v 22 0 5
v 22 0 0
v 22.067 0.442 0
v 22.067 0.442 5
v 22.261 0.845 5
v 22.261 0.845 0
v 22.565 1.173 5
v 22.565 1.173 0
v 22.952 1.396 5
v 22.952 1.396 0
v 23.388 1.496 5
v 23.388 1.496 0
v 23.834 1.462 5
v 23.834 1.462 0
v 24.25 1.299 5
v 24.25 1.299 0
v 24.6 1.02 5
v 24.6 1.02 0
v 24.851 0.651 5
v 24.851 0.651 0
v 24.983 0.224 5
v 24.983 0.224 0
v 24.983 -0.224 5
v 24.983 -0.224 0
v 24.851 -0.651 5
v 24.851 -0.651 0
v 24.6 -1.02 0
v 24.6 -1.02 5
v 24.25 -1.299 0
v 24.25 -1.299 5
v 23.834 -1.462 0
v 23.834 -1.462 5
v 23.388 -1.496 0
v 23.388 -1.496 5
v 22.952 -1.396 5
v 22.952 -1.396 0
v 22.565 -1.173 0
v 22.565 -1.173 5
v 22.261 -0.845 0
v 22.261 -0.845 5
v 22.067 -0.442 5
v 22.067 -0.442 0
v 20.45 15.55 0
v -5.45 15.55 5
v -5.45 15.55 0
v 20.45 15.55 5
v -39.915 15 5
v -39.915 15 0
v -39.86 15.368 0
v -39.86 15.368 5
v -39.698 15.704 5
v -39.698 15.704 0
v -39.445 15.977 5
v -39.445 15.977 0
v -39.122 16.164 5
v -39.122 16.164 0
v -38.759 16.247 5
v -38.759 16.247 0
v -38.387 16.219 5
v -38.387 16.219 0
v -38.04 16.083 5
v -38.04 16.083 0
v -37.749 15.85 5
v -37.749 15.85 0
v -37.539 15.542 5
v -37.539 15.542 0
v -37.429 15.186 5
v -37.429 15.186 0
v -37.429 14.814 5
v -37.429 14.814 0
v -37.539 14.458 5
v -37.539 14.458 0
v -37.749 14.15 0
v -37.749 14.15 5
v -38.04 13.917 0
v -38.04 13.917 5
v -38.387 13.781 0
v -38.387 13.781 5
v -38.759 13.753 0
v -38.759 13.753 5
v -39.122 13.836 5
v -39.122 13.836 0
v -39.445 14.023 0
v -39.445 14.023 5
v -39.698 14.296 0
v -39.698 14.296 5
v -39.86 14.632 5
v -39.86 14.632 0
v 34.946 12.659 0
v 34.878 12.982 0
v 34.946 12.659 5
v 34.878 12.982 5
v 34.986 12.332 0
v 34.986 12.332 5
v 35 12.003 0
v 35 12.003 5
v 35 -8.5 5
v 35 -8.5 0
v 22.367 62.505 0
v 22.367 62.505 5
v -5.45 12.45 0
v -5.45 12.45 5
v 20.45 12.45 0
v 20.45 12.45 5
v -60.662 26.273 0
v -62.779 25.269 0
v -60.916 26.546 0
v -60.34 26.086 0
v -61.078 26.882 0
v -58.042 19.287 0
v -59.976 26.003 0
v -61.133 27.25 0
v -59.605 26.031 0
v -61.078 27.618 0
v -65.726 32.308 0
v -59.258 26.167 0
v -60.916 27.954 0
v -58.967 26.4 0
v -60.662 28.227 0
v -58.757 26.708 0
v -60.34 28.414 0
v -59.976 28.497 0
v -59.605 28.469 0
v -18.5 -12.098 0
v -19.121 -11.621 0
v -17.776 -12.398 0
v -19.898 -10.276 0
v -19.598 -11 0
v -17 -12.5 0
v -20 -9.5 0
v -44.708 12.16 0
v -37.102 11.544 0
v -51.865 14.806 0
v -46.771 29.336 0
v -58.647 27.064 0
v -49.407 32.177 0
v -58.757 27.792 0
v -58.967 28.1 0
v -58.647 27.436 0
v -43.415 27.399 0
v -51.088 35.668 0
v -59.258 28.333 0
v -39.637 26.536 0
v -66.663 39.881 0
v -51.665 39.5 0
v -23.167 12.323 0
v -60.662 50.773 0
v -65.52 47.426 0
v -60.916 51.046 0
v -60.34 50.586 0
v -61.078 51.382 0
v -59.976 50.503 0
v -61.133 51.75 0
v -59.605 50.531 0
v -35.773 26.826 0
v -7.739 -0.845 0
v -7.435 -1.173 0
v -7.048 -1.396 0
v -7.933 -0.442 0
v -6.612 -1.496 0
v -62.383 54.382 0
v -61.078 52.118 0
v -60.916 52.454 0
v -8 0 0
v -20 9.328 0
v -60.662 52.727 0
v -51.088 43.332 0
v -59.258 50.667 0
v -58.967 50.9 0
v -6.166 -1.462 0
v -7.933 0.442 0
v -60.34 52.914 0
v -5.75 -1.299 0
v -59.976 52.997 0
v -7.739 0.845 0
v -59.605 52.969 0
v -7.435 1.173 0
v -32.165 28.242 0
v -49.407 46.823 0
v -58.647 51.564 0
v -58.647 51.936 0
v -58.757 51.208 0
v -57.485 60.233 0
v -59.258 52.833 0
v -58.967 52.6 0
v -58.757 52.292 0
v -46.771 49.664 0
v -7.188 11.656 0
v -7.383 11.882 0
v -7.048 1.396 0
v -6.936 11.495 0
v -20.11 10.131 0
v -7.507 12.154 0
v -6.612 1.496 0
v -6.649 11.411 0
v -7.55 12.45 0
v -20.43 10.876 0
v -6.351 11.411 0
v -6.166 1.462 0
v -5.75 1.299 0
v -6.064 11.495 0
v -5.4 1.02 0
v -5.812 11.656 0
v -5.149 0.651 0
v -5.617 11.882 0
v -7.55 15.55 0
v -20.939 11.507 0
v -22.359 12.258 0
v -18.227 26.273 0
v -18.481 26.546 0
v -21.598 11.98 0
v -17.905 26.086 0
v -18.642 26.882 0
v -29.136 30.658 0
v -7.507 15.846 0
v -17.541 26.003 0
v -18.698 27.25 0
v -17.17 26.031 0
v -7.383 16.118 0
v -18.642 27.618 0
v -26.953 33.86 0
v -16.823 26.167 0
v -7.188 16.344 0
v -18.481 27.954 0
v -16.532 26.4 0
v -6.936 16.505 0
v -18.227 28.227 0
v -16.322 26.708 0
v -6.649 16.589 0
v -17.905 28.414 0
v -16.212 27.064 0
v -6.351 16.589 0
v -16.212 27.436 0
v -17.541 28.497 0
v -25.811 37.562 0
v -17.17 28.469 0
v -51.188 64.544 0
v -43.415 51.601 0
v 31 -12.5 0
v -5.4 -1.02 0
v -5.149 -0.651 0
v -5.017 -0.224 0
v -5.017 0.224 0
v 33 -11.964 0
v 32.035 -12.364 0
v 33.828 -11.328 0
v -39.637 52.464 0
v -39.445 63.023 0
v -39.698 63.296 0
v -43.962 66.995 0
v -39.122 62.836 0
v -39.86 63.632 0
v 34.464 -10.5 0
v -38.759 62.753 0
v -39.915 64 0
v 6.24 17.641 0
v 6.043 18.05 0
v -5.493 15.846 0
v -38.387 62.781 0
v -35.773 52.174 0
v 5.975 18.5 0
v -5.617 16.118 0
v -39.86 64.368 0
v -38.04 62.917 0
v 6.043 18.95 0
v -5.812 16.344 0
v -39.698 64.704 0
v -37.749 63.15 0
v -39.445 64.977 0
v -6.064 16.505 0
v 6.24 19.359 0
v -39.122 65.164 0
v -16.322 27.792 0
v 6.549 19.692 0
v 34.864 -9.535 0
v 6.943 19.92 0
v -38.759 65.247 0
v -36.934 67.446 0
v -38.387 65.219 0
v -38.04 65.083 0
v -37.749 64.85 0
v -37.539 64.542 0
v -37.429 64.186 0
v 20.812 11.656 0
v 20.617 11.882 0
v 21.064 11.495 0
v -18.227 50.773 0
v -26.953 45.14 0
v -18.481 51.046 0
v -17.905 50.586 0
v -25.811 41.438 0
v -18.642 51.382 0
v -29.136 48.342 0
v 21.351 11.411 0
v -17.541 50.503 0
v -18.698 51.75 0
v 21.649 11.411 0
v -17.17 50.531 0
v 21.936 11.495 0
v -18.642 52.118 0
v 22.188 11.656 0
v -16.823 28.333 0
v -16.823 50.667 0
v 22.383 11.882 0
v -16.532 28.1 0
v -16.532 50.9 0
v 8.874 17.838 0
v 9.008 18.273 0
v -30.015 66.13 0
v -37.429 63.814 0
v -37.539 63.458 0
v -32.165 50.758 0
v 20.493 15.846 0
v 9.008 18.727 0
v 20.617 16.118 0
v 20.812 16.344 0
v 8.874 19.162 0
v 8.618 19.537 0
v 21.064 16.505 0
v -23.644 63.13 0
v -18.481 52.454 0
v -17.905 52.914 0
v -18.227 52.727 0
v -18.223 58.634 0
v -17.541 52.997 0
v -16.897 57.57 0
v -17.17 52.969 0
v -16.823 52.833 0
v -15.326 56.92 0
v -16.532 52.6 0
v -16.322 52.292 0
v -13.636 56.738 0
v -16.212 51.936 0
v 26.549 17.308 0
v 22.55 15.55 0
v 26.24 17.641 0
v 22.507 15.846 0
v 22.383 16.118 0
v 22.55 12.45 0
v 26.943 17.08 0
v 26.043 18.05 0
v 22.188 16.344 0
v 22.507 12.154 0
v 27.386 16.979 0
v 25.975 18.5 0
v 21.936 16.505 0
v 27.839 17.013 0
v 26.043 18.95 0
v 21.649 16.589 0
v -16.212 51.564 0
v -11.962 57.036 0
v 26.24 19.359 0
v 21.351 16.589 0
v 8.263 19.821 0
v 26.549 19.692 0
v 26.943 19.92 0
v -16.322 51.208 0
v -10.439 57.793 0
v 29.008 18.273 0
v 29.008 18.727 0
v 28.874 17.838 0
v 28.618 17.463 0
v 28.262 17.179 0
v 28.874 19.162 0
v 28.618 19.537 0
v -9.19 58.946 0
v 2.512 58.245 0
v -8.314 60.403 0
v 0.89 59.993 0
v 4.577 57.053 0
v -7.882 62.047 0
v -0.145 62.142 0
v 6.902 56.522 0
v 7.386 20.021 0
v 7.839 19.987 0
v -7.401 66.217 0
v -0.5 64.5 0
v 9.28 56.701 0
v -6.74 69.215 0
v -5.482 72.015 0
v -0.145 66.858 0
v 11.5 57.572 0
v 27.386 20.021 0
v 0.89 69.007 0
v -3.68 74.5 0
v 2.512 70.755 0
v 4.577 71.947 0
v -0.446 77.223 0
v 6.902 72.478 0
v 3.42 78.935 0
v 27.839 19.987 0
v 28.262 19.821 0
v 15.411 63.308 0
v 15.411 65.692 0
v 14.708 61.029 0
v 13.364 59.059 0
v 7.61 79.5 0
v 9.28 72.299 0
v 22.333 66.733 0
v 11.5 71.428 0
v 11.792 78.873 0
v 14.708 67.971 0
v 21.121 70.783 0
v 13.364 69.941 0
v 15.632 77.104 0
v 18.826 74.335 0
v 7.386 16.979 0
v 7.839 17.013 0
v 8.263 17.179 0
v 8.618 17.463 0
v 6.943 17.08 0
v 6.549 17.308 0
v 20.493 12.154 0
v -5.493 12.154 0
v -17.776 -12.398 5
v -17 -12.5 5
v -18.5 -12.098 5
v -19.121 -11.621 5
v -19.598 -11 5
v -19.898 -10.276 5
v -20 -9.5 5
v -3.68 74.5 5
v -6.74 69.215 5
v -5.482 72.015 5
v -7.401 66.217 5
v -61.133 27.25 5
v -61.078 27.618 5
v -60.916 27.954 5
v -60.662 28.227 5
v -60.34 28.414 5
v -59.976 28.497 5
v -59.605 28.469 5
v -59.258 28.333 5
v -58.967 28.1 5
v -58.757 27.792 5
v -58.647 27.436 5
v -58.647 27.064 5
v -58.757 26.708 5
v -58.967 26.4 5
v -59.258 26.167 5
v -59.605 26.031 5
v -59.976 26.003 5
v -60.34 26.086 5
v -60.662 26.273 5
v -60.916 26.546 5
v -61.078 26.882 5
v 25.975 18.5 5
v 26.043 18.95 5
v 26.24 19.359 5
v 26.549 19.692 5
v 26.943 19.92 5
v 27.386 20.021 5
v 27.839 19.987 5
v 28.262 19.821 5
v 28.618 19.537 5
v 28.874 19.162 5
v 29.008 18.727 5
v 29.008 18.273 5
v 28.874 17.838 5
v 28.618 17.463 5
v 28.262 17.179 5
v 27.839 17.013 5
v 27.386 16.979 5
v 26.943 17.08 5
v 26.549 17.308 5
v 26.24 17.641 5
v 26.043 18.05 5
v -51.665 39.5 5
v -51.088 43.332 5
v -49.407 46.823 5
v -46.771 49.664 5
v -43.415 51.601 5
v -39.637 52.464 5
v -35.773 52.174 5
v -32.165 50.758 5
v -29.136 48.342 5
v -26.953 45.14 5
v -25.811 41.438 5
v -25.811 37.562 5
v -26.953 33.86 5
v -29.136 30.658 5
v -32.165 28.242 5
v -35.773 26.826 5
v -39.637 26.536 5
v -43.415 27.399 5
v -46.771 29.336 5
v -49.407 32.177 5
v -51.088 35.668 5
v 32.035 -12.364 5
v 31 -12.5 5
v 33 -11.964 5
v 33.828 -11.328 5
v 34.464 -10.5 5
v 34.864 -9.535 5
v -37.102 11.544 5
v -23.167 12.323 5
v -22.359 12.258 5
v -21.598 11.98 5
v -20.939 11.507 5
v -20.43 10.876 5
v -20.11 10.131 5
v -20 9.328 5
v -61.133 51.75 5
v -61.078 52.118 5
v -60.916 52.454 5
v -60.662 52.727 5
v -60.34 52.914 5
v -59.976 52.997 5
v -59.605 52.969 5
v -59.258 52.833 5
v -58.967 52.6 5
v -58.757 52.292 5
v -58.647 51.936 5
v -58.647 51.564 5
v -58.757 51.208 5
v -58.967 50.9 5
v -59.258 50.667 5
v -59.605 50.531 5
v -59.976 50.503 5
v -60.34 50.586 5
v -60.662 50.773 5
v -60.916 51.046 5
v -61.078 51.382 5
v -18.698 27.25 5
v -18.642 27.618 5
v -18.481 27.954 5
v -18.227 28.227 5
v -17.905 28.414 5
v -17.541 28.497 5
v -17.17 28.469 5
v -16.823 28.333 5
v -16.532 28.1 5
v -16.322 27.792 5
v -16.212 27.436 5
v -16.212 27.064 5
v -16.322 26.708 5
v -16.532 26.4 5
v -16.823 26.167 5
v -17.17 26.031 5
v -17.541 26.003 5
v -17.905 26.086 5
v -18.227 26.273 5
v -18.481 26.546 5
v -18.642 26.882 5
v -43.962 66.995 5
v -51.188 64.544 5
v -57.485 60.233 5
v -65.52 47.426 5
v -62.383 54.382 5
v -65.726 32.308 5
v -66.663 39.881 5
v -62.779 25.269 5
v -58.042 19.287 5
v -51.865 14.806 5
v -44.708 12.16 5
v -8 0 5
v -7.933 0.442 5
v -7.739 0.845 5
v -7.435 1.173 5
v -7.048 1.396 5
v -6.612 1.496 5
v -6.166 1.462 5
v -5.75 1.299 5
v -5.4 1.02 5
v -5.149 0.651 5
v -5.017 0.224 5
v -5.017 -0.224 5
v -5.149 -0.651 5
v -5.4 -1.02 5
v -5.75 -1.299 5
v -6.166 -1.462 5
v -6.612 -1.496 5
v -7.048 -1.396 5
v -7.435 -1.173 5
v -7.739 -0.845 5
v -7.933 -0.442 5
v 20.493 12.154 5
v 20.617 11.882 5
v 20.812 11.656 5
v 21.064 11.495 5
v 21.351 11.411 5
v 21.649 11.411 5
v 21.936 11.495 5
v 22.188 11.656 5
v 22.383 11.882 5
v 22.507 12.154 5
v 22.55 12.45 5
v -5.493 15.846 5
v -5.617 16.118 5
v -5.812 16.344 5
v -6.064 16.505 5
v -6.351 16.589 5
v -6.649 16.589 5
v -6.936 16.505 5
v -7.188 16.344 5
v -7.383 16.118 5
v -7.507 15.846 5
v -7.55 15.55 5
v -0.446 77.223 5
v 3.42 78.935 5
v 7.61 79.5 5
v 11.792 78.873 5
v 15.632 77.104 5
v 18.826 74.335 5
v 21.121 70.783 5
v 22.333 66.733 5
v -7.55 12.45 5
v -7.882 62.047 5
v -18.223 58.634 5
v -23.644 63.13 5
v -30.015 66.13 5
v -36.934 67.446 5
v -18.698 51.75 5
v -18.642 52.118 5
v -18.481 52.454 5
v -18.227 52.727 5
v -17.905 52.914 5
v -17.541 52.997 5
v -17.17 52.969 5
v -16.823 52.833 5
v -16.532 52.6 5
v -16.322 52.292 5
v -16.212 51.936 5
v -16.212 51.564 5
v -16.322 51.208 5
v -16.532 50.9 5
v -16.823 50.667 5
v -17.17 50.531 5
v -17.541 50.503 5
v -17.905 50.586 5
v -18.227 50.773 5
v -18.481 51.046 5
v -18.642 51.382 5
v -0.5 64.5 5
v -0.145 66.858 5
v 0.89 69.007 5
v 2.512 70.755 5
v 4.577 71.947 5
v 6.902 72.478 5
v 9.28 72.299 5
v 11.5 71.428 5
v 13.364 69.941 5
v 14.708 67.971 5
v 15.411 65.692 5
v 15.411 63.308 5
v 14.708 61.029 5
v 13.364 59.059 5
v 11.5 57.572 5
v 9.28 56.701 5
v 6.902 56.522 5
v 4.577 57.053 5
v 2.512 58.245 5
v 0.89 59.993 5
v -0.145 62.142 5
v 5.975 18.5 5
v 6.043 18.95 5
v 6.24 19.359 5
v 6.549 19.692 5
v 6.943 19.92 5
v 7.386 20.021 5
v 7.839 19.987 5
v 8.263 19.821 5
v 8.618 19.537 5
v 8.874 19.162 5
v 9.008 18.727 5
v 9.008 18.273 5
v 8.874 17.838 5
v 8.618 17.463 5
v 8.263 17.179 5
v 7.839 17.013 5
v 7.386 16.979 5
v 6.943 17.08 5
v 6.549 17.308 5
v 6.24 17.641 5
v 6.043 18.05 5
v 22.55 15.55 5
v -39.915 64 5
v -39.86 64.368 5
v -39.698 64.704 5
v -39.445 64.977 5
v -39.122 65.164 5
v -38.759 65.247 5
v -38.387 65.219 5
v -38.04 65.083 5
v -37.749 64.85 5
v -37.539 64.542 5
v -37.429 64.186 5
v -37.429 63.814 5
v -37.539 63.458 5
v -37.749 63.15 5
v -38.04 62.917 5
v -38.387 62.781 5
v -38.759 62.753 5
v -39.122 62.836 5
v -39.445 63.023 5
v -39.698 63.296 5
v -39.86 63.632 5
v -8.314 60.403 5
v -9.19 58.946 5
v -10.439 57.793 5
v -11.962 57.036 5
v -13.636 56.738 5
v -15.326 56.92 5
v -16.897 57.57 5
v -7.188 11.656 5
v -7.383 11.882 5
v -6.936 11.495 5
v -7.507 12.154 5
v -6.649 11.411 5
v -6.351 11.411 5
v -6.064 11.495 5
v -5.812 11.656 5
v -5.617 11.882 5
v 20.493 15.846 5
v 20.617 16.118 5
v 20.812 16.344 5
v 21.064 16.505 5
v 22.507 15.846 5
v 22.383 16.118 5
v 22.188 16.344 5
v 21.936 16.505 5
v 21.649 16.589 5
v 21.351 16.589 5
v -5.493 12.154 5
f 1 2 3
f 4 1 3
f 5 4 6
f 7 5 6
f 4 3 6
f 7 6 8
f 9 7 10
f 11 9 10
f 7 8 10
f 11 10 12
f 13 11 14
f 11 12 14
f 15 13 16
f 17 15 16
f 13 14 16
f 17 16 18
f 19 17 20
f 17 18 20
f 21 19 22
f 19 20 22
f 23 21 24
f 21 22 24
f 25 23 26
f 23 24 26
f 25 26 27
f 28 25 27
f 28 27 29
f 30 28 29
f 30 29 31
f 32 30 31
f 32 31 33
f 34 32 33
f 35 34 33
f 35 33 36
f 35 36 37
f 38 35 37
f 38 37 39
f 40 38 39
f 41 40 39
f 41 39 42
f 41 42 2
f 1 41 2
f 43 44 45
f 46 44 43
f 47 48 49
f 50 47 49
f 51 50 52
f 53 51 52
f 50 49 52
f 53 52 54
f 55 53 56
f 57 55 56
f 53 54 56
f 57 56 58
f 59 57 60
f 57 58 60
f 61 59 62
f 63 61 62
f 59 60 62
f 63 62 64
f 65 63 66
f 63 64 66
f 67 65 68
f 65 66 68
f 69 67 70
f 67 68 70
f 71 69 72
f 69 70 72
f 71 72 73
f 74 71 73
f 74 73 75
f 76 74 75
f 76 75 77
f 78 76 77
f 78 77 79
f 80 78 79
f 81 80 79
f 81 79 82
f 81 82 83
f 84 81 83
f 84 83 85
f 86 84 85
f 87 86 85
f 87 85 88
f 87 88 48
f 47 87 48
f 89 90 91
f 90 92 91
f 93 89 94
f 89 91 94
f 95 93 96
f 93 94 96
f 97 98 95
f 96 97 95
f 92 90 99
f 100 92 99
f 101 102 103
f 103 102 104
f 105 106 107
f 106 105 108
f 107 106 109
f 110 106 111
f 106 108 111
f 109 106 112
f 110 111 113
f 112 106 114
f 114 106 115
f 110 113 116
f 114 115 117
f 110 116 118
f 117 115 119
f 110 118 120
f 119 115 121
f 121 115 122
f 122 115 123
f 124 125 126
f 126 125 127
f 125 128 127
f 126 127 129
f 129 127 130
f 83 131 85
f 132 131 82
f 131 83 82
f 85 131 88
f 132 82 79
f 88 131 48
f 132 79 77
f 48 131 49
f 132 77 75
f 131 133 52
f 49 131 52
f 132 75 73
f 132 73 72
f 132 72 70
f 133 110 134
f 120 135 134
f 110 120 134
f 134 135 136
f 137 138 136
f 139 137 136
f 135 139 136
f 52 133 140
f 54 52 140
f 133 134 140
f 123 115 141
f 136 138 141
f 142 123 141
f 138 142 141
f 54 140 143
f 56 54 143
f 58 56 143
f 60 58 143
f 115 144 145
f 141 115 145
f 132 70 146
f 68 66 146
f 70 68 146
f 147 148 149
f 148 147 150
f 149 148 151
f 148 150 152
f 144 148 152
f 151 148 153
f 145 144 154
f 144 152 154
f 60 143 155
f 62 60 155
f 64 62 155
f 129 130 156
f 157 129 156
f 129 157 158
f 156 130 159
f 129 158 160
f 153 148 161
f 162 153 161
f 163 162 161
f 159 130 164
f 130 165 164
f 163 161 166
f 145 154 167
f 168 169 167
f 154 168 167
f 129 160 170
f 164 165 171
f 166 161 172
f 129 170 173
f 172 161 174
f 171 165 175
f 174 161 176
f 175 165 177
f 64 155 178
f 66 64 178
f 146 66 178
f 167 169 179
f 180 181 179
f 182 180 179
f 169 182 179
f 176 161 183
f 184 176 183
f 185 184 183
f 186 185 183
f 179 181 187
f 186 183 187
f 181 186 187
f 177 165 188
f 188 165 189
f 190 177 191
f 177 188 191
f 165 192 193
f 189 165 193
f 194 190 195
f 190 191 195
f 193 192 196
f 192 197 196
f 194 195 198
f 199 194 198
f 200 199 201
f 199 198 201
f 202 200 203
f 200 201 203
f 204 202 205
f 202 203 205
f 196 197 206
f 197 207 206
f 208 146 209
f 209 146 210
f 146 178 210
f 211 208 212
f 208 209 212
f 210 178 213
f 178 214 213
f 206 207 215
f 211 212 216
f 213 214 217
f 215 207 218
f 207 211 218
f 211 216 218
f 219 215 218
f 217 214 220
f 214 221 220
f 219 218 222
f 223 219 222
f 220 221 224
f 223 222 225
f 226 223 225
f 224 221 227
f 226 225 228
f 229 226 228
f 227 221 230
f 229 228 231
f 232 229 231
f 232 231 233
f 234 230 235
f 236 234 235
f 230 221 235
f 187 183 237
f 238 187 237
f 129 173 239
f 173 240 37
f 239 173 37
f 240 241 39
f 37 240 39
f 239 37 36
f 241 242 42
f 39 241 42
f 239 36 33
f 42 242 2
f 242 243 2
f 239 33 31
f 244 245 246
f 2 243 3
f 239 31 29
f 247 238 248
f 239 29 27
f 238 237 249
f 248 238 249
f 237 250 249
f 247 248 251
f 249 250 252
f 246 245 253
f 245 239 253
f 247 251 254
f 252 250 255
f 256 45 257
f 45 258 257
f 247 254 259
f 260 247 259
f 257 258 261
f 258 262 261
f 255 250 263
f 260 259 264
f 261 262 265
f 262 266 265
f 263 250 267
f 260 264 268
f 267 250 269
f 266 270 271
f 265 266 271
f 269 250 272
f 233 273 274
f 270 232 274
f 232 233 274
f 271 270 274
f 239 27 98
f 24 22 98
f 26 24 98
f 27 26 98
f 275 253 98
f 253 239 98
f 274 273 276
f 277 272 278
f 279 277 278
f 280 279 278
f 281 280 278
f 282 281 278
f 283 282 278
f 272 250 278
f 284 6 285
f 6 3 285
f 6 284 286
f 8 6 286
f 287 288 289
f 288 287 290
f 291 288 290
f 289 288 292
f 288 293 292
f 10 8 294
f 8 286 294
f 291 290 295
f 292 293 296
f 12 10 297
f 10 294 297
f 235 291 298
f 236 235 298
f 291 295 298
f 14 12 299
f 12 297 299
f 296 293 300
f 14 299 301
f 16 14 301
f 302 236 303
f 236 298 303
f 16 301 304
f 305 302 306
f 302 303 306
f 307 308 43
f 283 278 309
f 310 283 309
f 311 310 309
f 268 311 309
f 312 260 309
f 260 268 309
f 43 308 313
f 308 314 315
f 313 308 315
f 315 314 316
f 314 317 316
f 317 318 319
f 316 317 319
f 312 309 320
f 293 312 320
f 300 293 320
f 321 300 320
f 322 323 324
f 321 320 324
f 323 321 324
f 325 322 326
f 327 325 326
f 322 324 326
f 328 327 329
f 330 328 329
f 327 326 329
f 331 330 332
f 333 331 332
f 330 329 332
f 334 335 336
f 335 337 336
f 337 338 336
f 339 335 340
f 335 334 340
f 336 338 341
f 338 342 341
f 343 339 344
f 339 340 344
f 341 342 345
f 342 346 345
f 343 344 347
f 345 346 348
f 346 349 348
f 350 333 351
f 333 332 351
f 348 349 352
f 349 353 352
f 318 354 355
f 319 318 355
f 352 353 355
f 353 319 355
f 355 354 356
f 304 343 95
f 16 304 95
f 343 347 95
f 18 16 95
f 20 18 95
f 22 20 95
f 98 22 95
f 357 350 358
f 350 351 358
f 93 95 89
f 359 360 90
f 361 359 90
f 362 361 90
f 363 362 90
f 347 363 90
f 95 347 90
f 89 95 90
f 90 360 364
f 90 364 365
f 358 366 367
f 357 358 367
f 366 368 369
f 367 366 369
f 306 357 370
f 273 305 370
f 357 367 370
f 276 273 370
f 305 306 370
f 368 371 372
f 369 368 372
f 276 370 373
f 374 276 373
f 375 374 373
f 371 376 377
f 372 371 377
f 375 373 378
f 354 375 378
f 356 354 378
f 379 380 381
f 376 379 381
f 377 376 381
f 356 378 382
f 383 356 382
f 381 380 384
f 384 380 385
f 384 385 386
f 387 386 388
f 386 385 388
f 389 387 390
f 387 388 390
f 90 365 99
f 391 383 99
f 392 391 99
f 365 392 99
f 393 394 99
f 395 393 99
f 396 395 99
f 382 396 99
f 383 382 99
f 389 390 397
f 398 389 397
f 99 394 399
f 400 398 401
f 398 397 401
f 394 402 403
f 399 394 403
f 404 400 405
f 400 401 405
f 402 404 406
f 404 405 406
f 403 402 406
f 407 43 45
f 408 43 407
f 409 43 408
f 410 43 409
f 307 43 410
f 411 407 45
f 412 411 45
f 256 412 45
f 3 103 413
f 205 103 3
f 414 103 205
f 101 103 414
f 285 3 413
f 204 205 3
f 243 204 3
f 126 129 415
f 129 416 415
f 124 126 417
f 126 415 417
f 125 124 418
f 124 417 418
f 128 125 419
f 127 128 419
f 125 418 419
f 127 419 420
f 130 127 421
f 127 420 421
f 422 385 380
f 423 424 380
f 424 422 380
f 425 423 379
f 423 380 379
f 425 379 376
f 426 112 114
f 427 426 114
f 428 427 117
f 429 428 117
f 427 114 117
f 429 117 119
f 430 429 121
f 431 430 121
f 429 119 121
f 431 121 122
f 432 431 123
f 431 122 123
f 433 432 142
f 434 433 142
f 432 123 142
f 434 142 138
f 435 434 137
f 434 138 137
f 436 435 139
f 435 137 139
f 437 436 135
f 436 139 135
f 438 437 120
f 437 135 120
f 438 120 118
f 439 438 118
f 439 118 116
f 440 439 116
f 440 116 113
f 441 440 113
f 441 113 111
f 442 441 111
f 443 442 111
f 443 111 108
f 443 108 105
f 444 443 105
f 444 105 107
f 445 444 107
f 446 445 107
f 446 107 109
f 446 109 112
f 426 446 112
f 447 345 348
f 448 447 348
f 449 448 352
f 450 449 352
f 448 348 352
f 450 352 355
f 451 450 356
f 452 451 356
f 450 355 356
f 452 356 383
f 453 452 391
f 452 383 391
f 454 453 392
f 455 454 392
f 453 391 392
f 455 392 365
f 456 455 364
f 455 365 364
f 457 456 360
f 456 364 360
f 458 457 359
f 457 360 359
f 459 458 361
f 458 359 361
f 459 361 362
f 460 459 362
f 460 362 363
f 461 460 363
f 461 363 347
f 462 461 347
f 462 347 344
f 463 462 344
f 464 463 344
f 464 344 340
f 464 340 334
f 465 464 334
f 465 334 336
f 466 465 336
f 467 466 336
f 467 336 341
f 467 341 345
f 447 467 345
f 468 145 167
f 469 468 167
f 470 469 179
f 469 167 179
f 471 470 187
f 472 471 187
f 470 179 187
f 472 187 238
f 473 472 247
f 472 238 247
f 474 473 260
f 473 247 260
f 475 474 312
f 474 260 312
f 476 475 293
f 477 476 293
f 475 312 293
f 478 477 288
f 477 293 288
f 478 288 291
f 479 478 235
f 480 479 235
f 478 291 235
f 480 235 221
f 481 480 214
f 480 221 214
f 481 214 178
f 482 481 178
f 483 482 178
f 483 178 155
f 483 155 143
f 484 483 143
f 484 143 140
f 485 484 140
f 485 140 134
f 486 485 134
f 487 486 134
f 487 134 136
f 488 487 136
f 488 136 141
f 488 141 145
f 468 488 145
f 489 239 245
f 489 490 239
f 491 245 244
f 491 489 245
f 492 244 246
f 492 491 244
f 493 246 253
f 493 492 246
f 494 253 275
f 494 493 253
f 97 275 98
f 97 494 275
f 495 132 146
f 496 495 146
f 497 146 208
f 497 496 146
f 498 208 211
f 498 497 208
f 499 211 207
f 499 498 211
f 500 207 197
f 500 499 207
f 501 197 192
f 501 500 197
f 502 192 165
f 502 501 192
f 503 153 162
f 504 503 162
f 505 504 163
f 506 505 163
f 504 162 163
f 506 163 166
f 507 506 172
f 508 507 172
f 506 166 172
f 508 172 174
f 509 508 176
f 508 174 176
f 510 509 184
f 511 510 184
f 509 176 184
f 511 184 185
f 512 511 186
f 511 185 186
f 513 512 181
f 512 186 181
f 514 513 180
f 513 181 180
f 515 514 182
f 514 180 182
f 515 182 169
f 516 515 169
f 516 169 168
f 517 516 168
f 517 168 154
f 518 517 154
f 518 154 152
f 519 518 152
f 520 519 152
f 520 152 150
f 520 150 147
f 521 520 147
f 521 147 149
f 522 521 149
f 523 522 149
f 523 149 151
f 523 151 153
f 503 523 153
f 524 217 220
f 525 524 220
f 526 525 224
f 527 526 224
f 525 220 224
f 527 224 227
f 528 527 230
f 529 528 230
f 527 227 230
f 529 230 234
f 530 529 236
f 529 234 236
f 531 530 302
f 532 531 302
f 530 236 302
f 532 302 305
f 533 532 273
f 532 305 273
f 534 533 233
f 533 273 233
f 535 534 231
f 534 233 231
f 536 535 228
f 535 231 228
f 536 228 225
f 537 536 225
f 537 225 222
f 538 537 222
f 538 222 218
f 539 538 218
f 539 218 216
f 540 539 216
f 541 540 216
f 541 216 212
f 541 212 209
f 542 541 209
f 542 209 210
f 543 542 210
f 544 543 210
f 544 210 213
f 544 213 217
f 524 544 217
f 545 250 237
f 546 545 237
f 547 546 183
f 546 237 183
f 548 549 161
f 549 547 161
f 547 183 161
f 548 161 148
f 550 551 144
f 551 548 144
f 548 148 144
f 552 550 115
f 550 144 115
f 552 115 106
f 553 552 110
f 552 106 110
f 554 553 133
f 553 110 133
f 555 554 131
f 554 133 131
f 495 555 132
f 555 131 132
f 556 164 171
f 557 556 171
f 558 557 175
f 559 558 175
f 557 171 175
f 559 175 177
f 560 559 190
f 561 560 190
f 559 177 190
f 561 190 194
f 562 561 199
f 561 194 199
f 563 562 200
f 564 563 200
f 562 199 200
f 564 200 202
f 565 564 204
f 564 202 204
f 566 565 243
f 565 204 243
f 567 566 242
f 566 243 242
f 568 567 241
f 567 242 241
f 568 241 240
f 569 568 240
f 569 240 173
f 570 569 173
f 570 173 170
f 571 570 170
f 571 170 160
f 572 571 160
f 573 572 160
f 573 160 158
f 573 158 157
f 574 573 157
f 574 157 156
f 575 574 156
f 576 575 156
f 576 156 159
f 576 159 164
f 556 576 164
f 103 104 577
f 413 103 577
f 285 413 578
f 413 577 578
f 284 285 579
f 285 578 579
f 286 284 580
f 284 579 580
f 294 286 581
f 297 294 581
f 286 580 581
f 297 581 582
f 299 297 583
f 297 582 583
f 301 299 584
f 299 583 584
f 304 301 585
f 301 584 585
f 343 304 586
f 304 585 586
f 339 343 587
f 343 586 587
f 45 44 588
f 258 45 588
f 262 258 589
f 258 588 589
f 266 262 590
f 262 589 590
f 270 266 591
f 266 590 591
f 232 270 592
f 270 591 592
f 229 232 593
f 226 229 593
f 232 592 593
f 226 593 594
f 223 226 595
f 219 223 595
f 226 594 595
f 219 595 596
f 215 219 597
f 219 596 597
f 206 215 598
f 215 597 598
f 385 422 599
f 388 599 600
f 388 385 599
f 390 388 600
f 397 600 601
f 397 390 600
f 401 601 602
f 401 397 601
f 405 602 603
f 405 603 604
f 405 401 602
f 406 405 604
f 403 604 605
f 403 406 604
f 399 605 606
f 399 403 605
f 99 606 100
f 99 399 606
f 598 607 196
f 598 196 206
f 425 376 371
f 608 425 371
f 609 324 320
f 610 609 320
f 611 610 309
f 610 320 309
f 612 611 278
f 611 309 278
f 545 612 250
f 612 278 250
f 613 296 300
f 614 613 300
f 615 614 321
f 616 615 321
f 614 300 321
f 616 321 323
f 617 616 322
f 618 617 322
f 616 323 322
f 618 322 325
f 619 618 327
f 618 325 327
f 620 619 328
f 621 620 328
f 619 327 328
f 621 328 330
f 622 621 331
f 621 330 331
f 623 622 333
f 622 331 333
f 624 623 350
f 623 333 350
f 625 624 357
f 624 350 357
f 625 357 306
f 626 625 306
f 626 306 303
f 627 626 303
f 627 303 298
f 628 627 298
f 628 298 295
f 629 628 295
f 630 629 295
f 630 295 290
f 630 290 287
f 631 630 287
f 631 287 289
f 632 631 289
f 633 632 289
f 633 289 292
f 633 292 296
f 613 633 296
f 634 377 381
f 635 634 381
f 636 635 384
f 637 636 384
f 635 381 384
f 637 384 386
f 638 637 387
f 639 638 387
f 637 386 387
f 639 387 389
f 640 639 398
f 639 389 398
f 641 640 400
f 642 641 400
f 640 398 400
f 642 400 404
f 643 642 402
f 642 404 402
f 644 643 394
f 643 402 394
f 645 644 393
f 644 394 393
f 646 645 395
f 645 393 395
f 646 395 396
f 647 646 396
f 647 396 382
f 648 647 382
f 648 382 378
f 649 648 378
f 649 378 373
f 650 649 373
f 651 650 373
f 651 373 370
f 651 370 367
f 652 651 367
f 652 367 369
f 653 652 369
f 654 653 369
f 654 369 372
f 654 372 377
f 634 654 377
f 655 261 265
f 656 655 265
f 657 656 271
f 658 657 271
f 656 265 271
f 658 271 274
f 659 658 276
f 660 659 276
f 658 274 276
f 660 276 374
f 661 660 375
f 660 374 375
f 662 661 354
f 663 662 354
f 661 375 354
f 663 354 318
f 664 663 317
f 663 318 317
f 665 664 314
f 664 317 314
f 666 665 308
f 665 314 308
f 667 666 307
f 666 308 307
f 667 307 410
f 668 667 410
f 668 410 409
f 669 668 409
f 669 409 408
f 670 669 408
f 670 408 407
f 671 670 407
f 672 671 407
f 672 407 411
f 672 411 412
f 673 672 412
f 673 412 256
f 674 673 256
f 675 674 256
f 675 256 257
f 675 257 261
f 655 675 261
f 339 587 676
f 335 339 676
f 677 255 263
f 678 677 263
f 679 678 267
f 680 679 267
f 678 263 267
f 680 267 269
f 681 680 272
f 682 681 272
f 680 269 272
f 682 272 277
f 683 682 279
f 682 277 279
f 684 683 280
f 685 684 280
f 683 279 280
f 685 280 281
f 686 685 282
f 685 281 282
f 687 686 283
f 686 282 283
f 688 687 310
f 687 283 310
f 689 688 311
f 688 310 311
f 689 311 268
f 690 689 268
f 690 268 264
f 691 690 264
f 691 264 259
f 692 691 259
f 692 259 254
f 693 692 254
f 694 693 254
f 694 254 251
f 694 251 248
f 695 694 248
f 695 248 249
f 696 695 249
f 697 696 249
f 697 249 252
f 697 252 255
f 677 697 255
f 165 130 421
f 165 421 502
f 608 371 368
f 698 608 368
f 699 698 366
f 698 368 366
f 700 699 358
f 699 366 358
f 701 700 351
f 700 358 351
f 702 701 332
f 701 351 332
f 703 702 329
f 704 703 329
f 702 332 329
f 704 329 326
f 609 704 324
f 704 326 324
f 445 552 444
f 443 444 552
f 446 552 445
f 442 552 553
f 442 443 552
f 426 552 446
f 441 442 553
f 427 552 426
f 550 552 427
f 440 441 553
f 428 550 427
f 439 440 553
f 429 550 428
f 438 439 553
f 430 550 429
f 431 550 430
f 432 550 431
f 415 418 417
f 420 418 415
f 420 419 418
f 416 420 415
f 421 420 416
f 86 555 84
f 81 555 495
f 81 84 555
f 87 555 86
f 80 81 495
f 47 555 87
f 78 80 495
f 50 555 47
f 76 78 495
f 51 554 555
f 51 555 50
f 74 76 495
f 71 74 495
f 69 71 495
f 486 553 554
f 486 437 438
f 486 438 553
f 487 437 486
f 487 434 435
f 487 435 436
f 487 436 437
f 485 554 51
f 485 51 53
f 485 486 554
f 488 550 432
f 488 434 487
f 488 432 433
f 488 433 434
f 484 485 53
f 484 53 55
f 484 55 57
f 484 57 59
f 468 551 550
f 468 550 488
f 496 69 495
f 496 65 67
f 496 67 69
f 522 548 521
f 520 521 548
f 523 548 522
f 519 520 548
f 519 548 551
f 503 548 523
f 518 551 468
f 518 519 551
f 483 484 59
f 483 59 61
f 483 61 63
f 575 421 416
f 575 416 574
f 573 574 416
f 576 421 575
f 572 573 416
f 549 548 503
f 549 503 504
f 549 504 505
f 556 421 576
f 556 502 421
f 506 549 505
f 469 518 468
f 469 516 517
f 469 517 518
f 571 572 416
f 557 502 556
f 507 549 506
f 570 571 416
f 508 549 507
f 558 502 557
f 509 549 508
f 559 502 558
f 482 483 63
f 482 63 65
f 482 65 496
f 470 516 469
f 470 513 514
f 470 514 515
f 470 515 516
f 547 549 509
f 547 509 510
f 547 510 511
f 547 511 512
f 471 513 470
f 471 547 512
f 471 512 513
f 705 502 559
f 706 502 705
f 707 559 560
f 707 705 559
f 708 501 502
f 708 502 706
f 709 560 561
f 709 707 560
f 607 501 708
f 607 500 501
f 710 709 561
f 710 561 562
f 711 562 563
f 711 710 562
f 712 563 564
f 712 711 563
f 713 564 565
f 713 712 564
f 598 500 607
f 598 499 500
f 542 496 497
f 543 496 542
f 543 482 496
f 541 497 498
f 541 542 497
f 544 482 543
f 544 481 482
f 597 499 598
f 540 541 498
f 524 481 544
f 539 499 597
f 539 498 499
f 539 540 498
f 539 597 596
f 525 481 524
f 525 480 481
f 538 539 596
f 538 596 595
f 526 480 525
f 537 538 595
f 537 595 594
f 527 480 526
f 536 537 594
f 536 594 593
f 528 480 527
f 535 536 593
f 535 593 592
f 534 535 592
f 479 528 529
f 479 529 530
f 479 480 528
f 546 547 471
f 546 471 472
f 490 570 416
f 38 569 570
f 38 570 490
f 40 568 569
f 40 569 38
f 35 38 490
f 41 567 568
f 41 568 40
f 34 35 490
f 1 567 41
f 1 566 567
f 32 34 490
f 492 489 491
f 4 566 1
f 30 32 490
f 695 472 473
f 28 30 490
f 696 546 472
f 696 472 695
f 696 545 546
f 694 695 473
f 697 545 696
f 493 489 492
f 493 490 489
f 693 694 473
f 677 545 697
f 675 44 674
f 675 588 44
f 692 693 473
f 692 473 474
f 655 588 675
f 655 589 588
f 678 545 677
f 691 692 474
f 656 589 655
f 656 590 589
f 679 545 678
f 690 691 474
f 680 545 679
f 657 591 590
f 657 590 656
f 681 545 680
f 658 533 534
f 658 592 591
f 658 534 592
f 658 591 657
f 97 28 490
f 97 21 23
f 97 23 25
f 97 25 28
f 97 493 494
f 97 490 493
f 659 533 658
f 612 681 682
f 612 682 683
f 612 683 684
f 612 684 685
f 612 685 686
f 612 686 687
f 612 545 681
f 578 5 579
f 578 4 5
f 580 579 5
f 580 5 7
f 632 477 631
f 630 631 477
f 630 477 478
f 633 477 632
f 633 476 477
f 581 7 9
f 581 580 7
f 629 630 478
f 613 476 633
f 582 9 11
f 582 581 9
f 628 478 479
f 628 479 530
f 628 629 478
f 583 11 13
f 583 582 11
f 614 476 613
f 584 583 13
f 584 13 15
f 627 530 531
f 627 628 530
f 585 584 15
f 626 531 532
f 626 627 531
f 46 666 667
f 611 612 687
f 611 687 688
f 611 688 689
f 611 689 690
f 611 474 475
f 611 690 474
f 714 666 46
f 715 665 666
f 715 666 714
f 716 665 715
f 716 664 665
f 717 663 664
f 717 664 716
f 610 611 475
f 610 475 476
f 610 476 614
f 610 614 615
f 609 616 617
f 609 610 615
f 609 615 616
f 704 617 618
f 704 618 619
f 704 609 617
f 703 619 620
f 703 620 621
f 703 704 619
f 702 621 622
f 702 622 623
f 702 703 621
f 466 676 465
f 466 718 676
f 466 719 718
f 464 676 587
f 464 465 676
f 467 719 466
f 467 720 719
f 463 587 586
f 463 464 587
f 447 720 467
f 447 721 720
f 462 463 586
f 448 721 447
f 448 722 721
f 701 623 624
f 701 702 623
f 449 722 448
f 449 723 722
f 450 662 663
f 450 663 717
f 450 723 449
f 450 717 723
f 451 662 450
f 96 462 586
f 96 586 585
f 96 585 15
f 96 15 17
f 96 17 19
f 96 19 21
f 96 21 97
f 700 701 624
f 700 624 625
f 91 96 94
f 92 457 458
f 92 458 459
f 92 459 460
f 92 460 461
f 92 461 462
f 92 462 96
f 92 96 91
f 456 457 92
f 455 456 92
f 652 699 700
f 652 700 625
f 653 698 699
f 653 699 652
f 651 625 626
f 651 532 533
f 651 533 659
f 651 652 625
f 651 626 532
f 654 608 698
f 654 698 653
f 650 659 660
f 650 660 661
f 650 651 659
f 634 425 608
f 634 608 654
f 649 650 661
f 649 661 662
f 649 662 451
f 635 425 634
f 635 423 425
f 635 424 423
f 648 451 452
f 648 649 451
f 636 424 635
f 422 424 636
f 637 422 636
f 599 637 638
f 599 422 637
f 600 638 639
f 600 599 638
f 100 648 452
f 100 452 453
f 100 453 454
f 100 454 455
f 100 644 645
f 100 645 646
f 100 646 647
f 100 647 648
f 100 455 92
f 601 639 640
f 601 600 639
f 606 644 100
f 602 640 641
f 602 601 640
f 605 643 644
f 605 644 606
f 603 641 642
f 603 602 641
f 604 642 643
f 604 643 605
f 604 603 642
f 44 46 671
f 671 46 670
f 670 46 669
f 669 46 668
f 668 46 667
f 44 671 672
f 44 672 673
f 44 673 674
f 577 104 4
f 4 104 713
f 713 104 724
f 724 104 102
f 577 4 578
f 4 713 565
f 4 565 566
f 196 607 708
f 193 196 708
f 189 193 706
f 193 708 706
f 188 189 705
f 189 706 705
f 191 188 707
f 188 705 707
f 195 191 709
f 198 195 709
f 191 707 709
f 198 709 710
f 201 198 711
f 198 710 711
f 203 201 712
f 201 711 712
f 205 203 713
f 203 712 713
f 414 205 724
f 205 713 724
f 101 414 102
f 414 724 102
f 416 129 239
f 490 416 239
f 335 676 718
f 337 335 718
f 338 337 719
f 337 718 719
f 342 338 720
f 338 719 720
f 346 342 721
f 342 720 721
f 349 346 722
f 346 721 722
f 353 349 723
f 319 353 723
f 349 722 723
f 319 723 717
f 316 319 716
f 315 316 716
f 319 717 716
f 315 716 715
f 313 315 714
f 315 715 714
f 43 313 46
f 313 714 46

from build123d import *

# Parameters (mm, degrees)
SKETCH_1_W           = 40
SKETCH_1_H           = 25
EXTRUDE_1_DEPTH      = 5
SKETCH_2_W           = 25
SKETCH_2_H           = 62
EXTRUDE_2_DEPTH      = 5
SKETCH_3_R           = 8
CUT_EXTRUDE_1_DEPTH  = 14
EXTRUDE_3_DEPTH      = 5
EXTRUDE_4_DEPTH      = 5
SKETCH_6_R           = 1.25
CUT_EXTRUDE_2_DEPTH  = 10
SKETCH_7_R           = 13
CUT_EXTRUDE_3_DEPTH  = 10
FILLET_1_R           = 3
EXTRUDE_6_DEPTH      = 5
FILLET_5_R           = 4
SKETCH_12_R          = 15
SKETCH_12_R_2        = 8
EXTRUDE_7_DEPTH      = 5
CUT_EXTRUDE_6_DEPTH  = 10
SKETCH_14_W          = 30.1
SKETCH_14_H          = 3.1
CUT_EXTRUDE_7_DEPTH  = 5
SKETCH_15_R          = 1.05
CUT_EXTRUDE_8_DEPTH  = 5
SKETCH_18_R          = 1.5
CUT_EXTRUDE_12_DEPTH = 10
SKETCH_20_R          = 1.525
CUT_EXTRUDE_14_DEPTH = 10


with BuildPart() as part:
    # 草图1 → 凸台-拉伸1 (new body)
    with BuildSketch(Plane.XY):
        Rectangle(SKETCH_1_W, SKETCH_1_H)
    extrude(amount=EXTRUDE_1_DEPTH)

    # 草图2 → 凸台-拉伸2 (add)
    with BuildSketch(Plane.XY.offset(5)):
        with Locations((7.5, 43.5)):
            Rectangle(SKETCH_2_W, SKETCH_2_H)
    extrude(amount=-EXTRUDE_2_DEPTH)

    # 草图3 → 切除-拉伸1 (cut)
    with BuildSketch(Plane(origin=(0, 0, 0), x_dir=(-1, 0, 0), z_dir=(0, 0, -1))):
        with Locations((-7.5, 64.5)):
            Circle(SKETCH_3_R)
    extrude(amount=-CUT_EXTRUDE_1_DEPTH, mode=Mode.SUBTRACT)

    # 草图4 → 凸台-拉伸3 (add)
    with BuildSketch(Plane(origin=(0, 0, 0), x_dir=(-1, 0, 0), z_dir=(0, 0, -1))):
        Polygon((5, 74.5), (20, 12.5), (5, 12.5), align=None)
    extrude(amount=-EXTRUDE_3_DEPTH)

    # 草图5 → 凸台-拉伸4 (add)
    with BuildSketch(Plane(origin=(0, 0, 0), x_dir=(-1, 0, 0), z_dir=(0, 0, -1))):
        with BuildLine():
            Line((5, 74.5), (43.961916065, 66.994501049))
            ThreePointArc((43.961916065, 66.994501049), (66.453639267, 36.062373582), (37.102191657, 11.543673671))
            Line((37.102191657, 11.543673671), (20, 12.5))
            Line((20, 12.5), (5, 74.5))
        make_face()
    extrude(amount=-EXTRUDE_4_DEPTH)

    # 草图6 → 切除-拉伸2 (cut)
    with BuildSketch(Plane(origin=(0, 0, 0), x_dir=(-1, 0, 0), z_dir=(0, 0, -1))):
        with Locations((38.665463282, 64)):
            Circle(SKETCH_6_R)
        with Locations((59.883085674, 51.75)):
            Circle(SKETCH_6_R)
        with Locations((59.883085674, 27.25)):
            Circle(SKETCH_6_R)
        with Locations((38.665463282, 15)):
            Circle(SKETCH_6_R)
        with Locations((17.447840889, 27.25)):
            Circle(SKETCH_6_R)
        with Locations((17.447840889, 51.75)):
            Circle(SKETCH_6_R)
    extrude(amount=-CUT_EXTRUDE_2_DEPTH, mode=Mode.SUBTRACT)

    # 草图7 → 切除-拉伸3 (cut)
    with BuildSketch(Plane(origin=(0, 0, 0), x_dir=(-1, 0, 0), z_dir=(0, 0, -1))):
        with Locations((38.665463282, 39.5)):
            Circle(SKETCH_7_R)
    extrude(amount=-CUT_EXTRUDE_3_DEPTH, mode=Mode.SUBTRACT)

    # 圆角1
    fillet_1_edges = [part.edges().sort_by_distance(p)[0] for p in [
        (20, 74.5, 2.5),
        (20, -12.5, 2.5),
        (-20, -12.5, 2.5),
        (-20, 12.5, 2.5),
    ]]
    fillet(fillet_1_edges, radius=FILLET_1_R)

    # 草图9 → 凸台-拉伸6 (add)
    with BuildSketch(Plane(origin=(0, 0, 0), x_dir=(-1, 0, 0), z_dir=(0, 0, -1))):
        Polygon((-17, -12.5), (-35, -12.5), (-35, 12.5), (-19.908611993, 72.234830778), align=None)
    extrude(amount=-EXTRUDE_6_DEPTH)

    # 圆角5
    fillet_5_edges = [part.edges().sort_by_distance(p)[0] for p in [
        (35, -12.5, 2.5),
        (35, 12.5, 2.5),
    ]]
    fillet(fillet_5_edges, radius=FILLET_5_R)

    # 草图12 → 凸台-拉伸7 (add)
    with BuildSketch(Plane(origin=(0, 0, 0), x_dir=(-1, 0, 0), z_dir=(0, 0, -1))):
        with Locations((-7.5, 64.5)):
            Circle(SKETCH_12_R)
        with Locations((-7.5, 64.5)):
            Circle(SKETCH_12_R_2, mode=Mode.SUBTRACT)
    extrude(amount=-EXTRUDE_7_DEPTH)

    # 草图13 → 切除-拉伸6 (cut)
    with BuildSketch(Plane(origin=(0, 0, 0), x_dir=(-1, 0, 0), z_dir=(0, 0, -1))):
        with BuildLine():
            Line((7.401386096, 66.217175707), (7.881923771, 62.047143837))
            ThreePointArc((7.881923771, 62.047143837), (11.961869133, 57.036355872), (18.223004987, 58.633893981))
            ThreePointArc((18.223004987, 58.633893981), (30.76141934, 66.361237674), (45.486790657, 66.65638954))
            Line((45.486790657, 66.65638954), (-3.845717477, 79.048065825))
            ThreePointArc((-3.845717477, 79.048065825), (3.779900034, 74.38756063), (7.401386096, 66.217175707))
        make_face()
    extrude(amount=-CUT_EXTRUDE_6_DEPTH, mode=Mode.SUBTRACT)

    # 草图14 → 切除-拉伸7 (cut)
    with BuildSketch(Plane.XY.offset(5)):
        with Locations((7.5, 14)):
            Rectangle(SKETCH_14_W, SKETCH_14_H)
    extrude(amount=-CUT_EXTRUDE_7_DEPTH, mode=Mode.SUBTRACT)

    # 草图15 → 切除-拉伸8 (cut)
    with BuildSketch(Plane.XY.offset(5)):
        with Locations((-6.5, 15.55)):
            Circle(SKETCH_15_R)
        with Locations((21.5, 15.55)):
            Circle(SKETCH_15_R)
        with Locations((-6.5, 12.45)):
            Circle(SKETCH_15_R)
        with Locations((21.5, 12.45)):
            Circle(SKETCH_15_R)
    extrude(amount=-CUT_EXTRUDE_8_DEPTH, mode=Mode.SUBTRACT)

    # 草图18 → 切除-拉伸12 (cut)
    with BuildSketch(Plane(origin=(0, 0, 0), x_dir=(-1, 0, 0), z_dir=(0, 0, -1))):
        with Locations((-23.5, 0)):
            Circle(SKETCH_18_R)
        with Locations((6.5, 0)):
            Circle(SKETCH_18_R)
    extrude(amount=-CUT_EXTRUDE_12_DEPTH, mode=Mode.SUBTRACT)

    # 草图20 → 切除-拉伸14 (cut)
    with BuildSketch(Plane(origin=(0, 0, 0), x_dir=(-1, 0, 0), z_dir=(0, 0, -1))):
        with Locations((-27.5, 18.5)):
            Circle(SKETCH_20_R)
        with Locations((-7.5, 18.5)):
            Circle(SKETCH_20_R)
    extrude(amount=-CUT_EXTRUDE_14_DEPTH, mode=Mode.SUBTRACT)


solid = part.part
